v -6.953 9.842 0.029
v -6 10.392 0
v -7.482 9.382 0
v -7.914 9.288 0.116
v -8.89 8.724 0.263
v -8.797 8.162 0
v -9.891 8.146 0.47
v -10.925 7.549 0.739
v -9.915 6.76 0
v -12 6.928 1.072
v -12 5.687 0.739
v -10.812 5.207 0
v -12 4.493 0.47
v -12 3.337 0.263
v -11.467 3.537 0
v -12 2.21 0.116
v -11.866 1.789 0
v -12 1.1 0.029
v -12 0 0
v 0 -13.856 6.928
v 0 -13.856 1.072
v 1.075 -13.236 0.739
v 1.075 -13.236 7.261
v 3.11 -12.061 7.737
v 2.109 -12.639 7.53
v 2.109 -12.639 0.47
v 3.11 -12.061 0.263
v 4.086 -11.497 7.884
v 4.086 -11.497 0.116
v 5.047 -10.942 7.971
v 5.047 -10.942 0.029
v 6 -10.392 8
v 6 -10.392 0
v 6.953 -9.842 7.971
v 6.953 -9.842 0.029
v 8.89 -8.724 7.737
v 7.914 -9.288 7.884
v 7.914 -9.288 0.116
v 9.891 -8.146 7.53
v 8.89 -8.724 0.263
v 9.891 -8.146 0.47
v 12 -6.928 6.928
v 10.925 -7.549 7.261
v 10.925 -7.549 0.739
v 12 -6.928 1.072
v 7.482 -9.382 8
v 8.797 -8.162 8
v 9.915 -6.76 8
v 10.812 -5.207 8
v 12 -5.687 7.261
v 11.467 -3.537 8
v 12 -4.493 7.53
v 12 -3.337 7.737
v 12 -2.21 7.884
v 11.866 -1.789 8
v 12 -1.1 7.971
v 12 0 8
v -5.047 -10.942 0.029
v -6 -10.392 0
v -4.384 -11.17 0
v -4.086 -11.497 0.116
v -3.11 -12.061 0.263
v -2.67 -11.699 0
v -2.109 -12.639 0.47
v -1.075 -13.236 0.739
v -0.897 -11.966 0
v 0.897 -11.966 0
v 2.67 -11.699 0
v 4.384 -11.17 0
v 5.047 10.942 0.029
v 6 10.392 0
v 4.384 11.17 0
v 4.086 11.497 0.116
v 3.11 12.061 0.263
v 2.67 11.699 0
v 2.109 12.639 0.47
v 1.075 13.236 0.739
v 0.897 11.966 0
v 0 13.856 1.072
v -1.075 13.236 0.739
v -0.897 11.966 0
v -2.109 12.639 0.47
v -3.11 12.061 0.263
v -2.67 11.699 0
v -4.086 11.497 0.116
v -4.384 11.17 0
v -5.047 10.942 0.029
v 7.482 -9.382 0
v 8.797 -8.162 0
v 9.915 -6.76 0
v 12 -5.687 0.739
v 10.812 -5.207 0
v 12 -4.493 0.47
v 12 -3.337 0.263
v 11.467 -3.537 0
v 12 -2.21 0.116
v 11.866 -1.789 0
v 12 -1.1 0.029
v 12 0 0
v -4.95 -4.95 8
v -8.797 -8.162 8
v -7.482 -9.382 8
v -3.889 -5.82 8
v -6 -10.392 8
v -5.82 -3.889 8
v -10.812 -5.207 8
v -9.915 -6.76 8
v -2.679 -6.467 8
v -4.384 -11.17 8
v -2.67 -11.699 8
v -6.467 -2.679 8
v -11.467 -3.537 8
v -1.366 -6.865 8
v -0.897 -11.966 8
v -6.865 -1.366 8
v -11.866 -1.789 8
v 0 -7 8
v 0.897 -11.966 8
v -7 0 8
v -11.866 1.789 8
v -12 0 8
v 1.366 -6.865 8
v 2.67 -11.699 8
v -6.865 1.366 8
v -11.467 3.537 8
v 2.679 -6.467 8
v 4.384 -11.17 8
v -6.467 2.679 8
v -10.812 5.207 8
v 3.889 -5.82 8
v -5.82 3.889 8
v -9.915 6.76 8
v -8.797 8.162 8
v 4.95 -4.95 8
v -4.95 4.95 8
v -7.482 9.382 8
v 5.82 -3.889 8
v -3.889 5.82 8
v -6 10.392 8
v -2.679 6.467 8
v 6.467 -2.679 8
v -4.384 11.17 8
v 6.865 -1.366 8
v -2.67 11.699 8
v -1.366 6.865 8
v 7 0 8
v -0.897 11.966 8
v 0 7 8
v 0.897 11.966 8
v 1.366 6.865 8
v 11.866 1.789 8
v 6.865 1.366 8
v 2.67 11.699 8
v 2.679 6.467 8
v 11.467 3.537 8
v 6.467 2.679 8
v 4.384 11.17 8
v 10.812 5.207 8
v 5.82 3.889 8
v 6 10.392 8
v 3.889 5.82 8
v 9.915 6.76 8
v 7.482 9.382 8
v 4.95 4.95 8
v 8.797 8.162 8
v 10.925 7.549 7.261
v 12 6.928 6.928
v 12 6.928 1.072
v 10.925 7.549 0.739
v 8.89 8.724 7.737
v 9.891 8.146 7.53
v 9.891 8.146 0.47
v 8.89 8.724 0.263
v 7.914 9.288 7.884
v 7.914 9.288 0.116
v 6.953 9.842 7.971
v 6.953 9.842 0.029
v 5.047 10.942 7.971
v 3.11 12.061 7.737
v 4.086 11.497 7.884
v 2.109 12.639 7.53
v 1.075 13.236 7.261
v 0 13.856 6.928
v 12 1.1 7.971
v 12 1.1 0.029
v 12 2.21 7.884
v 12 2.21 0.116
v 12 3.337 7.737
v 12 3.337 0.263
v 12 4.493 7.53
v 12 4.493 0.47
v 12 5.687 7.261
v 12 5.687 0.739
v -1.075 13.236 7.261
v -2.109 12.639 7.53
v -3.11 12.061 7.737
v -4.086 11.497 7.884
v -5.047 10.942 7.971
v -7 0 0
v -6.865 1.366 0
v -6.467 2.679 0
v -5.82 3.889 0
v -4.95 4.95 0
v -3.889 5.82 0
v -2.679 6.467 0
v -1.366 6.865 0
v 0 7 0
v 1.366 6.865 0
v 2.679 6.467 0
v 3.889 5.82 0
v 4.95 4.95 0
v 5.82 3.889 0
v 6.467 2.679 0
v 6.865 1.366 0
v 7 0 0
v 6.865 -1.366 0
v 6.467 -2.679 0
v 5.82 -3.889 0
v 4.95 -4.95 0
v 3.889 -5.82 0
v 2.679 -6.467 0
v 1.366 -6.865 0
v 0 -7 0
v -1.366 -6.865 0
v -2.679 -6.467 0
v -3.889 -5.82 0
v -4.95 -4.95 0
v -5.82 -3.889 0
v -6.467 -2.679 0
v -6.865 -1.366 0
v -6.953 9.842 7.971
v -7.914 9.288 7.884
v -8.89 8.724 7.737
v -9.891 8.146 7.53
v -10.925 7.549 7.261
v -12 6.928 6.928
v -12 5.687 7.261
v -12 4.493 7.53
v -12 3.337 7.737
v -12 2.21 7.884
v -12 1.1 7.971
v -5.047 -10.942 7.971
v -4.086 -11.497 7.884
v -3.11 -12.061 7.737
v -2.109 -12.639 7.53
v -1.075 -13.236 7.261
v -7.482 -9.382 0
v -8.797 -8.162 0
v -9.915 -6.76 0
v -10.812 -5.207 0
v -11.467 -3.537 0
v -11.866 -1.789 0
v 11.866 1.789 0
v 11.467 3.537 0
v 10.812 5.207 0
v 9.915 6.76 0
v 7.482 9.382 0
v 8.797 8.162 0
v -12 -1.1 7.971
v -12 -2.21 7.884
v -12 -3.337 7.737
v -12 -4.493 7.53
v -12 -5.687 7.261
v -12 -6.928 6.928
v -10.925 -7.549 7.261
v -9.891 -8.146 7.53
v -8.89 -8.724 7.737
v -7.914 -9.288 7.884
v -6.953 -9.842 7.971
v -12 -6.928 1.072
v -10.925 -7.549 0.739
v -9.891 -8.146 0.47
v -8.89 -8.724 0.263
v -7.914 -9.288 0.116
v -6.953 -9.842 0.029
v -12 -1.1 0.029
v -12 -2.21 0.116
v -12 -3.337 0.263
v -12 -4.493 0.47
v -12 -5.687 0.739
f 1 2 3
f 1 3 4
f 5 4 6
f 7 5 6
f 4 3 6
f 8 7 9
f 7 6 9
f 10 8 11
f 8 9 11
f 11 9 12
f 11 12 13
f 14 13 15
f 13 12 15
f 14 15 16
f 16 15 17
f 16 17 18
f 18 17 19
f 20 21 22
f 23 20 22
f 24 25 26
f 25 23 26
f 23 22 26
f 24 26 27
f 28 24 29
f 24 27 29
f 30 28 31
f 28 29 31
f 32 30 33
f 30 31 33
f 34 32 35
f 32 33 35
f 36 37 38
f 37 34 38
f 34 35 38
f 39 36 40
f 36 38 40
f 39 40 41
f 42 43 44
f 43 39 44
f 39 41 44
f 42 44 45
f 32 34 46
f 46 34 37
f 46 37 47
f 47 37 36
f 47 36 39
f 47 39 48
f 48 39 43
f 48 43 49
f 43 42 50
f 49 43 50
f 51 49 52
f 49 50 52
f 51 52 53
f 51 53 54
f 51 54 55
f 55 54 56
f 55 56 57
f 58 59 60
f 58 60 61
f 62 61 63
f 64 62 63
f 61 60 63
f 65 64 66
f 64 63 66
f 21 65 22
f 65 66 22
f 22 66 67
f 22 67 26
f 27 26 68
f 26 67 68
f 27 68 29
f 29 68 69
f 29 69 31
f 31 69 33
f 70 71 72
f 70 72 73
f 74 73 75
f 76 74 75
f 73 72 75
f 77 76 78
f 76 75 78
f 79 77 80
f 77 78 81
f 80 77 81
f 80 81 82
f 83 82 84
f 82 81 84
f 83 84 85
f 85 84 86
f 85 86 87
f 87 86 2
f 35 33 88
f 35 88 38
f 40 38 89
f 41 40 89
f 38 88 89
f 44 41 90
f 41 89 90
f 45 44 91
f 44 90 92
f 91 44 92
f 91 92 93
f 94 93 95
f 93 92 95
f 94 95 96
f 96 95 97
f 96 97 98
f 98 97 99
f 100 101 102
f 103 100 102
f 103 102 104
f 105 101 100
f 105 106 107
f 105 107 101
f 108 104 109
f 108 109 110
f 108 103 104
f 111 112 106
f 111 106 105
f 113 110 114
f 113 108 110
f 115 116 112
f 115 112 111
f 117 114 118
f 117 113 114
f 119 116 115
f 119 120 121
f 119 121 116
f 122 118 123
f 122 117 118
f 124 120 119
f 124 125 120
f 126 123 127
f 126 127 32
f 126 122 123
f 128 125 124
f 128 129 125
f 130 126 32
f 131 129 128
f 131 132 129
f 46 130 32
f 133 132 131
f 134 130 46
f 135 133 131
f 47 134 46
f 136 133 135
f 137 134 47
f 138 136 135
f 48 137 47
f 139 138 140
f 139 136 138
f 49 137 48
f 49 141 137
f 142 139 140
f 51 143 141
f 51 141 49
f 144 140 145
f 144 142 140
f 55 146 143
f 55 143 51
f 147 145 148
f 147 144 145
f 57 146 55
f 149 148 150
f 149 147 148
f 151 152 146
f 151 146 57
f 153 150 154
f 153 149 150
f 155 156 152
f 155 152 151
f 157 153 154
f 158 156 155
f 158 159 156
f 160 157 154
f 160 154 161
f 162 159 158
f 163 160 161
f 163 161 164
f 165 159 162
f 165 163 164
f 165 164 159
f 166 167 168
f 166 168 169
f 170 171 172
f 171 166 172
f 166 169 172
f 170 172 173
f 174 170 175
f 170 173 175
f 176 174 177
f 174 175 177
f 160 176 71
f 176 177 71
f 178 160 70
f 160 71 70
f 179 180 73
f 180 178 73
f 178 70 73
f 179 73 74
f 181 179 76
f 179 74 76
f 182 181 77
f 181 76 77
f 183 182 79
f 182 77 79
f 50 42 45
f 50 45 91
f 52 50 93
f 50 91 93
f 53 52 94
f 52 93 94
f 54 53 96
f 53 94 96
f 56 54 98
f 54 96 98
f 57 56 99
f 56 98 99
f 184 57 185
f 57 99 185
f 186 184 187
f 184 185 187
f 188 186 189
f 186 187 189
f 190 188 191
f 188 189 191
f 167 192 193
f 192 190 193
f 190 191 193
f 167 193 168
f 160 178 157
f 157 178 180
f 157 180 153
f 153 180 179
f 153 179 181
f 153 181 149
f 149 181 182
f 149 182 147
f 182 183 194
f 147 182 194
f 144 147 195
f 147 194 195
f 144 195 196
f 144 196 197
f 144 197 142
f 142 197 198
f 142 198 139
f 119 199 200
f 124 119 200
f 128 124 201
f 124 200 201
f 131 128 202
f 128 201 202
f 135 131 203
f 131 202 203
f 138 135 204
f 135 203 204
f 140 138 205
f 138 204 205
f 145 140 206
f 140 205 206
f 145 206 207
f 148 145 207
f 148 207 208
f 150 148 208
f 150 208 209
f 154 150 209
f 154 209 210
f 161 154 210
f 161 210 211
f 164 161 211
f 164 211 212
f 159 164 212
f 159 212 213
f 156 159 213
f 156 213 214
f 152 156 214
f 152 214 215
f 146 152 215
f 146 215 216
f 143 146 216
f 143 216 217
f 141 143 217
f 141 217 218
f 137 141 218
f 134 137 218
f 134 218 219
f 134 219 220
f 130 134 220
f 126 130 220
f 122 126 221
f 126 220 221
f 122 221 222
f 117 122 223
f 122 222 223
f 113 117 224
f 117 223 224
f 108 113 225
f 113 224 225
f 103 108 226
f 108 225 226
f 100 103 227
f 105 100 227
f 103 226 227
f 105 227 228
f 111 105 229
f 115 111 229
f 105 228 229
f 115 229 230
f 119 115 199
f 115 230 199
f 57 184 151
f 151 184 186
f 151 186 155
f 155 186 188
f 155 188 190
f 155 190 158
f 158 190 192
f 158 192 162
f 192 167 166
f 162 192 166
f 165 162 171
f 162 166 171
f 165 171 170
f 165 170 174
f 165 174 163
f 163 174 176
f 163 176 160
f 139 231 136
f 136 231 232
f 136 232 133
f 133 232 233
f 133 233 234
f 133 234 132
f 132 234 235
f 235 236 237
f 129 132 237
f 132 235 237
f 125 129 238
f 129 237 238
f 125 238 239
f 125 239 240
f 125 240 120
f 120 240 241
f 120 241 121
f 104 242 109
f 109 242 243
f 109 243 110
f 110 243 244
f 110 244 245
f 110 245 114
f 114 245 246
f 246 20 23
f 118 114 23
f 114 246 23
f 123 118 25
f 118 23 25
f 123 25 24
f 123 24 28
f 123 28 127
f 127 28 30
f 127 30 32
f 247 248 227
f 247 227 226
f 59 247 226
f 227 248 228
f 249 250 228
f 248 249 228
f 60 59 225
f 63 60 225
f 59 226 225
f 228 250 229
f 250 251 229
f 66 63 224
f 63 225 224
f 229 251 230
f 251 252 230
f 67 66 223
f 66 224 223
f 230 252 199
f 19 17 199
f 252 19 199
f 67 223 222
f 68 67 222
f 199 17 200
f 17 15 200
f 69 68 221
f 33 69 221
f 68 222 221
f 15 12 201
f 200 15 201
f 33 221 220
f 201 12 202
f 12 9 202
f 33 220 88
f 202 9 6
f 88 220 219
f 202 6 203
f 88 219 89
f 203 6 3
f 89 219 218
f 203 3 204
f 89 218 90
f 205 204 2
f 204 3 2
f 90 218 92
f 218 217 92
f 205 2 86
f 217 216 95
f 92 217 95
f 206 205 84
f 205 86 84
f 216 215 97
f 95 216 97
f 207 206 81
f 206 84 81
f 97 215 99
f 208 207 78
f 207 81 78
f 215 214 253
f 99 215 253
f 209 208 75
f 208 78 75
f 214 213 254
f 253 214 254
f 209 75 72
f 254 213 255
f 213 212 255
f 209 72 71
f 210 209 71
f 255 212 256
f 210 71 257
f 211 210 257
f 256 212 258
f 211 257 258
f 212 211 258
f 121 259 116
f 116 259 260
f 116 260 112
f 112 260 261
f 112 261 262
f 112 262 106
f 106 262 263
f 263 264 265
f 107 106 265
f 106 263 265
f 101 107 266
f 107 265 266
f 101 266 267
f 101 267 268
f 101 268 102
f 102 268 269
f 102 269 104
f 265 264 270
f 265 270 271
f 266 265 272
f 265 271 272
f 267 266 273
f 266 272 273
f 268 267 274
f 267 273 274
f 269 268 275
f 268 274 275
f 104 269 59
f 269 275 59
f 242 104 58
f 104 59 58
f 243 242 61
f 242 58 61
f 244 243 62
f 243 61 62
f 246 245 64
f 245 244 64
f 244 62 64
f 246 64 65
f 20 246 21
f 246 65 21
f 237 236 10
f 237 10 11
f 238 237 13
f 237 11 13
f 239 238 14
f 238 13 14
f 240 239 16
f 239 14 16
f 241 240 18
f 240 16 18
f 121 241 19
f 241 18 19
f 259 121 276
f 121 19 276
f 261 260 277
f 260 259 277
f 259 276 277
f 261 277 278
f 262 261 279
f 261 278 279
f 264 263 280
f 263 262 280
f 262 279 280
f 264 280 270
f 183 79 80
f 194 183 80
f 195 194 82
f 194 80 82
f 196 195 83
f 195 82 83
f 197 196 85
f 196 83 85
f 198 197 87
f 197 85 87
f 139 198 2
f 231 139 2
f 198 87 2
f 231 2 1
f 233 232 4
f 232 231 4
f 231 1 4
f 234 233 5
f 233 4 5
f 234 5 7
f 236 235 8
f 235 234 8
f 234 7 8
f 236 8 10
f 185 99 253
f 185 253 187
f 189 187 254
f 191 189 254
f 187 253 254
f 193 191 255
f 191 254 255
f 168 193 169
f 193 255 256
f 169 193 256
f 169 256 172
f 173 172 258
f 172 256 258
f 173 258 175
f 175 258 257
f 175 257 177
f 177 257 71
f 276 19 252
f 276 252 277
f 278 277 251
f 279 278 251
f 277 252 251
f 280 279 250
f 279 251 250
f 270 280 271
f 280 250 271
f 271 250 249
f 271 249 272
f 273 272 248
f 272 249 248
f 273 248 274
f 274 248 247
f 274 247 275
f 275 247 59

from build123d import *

# Parameters (mm, degrees)
BASIS_LINEAR_AUSTRAGEN_DEPTH = 8
BOHRUNG1_D                   = 14


with BuildPart() as part:
    # Skizze1 → Basis-Linear austragen (new body)
    with BuildSketch(Plane.XY):
        Polygon((0, -13.856406461), (12, -6.92820323), (12, 6.92820323), (0, 13.856406461), (-12, 6.92820323), (-12, -6.92820323), align=None)
    extrude(amount=BASIS_LINEAR_AUSTRAGEN_DEPTH)

    # Skizze2 → Schnitt-Rotation1 (revolve, cut)
    with BuildSketch(Plane(origin=(0, 0, 0), x_dir=(0, 0, -1), z_dir=(1, 0, 0))):
        Polygon((-8, 12), (-6.92820323, 13.856406461), (-1.07179677, 13.856406461), (0, 12), (0, 14.856406461), (-8, 14.856406461), align=None)
    revolve(axis=Axis((0, 0, -0.921105868), (0, 0, 1)), mode=Mode.SUBTRACT)

    # Bohrung1 (through all)
    with Locations(Plane.XY.offset(8)):
        with Locations((0, 0)):
            Hole(BOHRUNG1_D / 2)


solid = part.part
